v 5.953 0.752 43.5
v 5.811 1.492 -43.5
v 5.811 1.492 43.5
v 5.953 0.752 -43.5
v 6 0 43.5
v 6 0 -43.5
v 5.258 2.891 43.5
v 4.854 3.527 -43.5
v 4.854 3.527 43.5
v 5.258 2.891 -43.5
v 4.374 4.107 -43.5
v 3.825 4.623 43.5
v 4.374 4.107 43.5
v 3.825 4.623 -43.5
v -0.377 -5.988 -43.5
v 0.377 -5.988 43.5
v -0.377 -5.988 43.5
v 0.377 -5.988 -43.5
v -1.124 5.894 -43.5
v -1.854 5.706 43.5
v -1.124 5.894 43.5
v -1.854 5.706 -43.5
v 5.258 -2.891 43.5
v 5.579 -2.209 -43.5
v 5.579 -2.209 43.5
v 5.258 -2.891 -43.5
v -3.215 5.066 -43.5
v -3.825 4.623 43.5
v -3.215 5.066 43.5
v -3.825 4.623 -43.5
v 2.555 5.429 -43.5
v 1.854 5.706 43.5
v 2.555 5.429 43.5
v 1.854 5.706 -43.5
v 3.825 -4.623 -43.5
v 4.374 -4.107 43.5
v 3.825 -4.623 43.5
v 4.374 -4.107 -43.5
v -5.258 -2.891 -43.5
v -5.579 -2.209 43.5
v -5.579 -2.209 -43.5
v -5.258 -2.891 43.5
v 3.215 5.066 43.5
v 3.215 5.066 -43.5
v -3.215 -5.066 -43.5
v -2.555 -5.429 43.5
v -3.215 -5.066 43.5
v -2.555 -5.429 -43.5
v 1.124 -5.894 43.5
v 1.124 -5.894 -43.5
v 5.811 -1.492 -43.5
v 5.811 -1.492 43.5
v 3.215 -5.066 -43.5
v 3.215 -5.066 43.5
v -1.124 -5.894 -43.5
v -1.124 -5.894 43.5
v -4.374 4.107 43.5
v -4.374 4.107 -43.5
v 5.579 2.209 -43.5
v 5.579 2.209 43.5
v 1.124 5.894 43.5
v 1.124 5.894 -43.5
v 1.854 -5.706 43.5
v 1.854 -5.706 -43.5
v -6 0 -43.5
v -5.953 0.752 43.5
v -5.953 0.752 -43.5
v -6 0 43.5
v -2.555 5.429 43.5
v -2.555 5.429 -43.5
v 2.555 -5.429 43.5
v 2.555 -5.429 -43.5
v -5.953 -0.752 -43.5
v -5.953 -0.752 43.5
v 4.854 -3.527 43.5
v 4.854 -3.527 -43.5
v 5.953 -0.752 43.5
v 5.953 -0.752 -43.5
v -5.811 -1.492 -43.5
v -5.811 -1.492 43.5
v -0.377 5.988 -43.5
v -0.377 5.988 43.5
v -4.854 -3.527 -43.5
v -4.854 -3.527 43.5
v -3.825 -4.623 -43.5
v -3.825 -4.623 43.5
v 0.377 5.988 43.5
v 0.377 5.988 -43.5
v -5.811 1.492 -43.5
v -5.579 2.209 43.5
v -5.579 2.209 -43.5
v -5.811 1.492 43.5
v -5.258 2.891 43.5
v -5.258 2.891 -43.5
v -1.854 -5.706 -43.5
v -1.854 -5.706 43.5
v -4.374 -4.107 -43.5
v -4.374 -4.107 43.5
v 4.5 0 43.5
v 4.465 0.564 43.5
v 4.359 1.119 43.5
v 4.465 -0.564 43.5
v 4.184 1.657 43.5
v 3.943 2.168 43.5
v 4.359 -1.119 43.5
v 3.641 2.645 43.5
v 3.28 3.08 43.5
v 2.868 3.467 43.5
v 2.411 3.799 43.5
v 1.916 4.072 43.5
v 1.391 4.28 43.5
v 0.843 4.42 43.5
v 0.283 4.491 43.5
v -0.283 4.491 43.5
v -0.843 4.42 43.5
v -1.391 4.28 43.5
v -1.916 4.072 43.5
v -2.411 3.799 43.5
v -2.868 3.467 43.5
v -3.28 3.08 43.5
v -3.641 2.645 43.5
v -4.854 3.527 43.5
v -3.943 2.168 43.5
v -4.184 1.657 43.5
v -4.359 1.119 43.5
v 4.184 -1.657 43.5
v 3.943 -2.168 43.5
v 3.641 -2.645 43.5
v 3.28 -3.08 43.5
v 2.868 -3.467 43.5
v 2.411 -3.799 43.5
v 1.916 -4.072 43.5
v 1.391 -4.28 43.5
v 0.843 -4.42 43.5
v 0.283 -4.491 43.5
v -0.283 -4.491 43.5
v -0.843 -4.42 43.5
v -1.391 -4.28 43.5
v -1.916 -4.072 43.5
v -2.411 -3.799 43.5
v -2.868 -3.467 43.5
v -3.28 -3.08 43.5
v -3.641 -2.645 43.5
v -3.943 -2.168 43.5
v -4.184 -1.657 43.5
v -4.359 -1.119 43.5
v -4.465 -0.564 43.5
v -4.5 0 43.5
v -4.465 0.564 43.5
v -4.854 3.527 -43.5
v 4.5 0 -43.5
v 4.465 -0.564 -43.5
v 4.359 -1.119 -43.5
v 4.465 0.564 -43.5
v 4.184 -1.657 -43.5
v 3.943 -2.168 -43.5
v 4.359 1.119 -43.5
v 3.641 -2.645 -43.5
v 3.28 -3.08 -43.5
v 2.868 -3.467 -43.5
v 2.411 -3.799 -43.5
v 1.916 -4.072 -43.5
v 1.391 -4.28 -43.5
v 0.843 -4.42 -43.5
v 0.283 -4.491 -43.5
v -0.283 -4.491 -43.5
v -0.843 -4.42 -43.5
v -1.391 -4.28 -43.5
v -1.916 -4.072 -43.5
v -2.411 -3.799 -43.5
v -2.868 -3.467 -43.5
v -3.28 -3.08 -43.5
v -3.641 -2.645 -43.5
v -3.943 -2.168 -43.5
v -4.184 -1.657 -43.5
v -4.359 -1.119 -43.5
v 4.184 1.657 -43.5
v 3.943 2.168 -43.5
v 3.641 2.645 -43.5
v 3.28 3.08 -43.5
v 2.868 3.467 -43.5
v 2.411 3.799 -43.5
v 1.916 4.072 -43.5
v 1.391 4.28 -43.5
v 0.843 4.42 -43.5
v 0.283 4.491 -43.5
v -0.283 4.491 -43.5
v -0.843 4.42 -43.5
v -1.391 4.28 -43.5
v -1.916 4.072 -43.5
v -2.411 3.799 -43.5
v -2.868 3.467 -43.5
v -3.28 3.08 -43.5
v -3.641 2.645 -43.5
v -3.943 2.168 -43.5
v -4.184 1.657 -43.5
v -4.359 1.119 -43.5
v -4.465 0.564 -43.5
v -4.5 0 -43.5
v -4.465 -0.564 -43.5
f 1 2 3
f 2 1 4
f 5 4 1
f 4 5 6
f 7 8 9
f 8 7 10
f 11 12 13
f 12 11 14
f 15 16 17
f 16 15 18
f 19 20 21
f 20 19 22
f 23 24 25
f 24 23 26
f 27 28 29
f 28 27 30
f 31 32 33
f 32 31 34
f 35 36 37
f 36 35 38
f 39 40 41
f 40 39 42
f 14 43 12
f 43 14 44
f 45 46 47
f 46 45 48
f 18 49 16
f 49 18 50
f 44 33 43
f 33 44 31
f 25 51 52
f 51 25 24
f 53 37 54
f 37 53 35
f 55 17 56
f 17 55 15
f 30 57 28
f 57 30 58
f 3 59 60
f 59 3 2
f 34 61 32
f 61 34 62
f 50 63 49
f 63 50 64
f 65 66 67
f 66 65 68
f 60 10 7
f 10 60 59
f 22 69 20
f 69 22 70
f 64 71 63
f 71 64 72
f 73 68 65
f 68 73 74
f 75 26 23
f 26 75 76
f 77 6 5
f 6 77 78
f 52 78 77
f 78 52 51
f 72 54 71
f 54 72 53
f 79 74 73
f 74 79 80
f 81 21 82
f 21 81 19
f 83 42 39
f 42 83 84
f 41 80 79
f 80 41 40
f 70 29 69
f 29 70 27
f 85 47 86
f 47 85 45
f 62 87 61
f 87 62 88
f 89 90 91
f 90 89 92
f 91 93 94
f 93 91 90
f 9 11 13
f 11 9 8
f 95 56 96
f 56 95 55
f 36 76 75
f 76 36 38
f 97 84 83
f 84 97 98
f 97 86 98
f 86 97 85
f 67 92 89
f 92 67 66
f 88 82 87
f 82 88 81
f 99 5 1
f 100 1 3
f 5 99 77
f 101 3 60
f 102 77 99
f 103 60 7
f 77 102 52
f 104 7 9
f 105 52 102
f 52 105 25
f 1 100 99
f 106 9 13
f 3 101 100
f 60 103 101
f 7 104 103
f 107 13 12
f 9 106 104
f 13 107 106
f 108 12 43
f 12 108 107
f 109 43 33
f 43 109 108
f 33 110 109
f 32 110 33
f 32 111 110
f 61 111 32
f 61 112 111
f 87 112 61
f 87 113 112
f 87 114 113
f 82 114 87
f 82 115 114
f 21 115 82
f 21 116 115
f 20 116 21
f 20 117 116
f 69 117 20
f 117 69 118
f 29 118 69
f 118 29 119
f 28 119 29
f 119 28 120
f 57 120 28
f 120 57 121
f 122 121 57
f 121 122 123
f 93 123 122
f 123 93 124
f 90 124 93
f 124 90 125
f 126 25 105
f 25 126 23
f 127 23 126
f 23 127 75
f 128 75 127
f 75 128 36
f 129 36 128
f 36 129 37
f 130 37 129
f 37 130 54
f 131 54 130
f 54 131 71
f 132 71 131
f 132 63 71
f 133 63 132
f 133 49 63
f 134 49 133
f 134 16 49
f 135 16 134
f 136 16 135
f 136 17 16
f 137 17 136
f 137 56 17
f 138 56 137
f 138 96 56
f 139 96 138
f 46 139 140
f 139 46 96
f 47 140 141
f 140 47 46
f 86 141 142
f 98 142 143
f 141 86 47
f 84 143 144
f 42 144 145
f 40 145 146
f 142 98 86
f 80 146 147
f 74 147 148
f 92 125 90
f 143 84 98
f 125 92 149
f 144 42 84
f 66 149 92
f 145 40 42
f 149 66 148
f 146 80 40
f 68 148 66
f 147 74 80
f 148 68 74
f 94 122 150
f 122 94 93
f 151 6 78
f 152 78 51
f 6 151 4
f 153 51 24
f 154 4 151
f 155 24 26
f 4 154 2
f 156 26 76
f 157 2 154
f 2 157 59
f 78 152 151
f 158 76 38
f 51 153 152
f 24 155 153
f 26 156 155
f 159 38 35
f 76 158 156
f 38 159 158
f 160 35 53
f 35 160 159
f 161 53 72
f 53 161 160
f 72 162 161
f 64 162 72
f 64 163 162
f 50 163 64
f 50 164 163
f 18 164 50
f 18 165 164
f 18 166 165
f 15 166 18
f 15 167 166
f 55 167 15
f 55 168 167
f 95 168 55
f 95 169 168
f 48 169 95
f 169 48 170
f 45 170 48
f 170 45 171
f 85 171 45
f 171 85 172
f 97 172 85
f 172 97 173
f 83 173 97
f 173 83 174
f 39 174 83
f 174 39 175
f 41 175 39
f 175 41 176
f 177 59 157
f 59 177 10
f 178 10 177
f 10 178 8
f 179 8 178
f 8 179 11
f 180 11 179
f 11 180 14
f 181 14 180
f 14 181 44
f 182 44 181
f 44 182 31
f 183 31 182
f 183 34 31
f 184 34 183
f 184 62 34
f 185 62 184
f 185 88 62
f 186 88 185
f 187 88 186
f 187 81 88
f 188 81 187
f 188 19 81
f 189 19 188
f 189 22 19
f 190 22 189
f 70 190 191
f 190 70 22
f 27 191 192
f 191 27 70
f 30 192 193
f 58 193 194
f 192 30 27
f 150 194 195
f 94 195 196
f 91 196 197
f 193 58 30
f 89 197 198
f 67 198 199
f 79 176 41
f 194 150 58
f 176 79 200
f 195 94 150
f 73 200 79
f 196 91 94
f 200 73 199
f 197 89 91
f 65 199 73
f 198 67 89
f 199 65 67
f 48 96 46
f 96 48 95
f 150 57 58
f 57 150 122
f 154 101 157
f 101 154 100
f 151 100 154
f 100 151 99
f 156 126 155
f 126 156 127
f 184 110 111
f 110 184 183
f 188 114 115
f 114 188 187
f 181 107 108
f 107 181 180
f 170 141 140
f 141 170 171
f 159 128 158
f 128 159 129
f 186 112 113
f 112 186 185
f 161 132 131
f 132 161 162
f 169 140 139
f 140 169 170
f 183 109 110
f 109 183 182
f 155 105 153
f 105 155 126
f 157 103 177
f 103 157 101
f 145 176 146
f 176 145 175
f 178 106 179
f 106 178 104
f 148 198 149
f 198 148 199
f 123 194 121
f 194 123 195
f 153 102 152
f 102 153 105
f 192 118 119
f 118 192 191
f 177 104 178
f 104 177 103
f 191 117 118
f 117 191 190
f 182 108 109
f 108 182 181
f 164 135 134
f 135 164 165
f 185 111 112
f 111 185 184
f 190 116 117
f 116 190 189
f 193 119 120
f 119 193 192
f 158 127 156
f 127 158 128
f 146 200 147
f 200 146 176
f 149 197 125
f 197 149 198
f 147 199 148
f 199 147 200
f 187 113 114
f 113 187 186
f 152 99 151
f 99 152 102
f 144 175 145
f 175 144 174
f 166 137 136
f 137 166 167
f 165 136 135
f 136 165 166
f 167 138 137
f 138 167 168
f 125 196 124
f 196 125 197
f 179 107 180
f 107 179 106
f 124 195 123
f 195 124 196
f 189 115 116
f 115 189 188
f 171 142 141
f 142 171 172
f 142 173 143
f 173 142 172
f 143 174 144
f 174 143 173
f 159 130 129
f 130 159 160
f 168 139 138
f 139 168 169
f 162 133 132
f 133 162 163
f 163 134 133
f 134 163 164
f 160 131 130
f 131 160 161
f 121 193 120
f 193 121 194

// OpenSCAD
$fn = 50;


difference() {
	union() {
		translate(v = [0, 0, -43.5000000000]) {
			cylinder(h = 87, r = 6.0000000000);
		}
	}
	union() {
		translate(v = [0, 0, -100.0000000000]) {
			cylinder(h = 200, r = 4.5000000000);
		}
	}
}
